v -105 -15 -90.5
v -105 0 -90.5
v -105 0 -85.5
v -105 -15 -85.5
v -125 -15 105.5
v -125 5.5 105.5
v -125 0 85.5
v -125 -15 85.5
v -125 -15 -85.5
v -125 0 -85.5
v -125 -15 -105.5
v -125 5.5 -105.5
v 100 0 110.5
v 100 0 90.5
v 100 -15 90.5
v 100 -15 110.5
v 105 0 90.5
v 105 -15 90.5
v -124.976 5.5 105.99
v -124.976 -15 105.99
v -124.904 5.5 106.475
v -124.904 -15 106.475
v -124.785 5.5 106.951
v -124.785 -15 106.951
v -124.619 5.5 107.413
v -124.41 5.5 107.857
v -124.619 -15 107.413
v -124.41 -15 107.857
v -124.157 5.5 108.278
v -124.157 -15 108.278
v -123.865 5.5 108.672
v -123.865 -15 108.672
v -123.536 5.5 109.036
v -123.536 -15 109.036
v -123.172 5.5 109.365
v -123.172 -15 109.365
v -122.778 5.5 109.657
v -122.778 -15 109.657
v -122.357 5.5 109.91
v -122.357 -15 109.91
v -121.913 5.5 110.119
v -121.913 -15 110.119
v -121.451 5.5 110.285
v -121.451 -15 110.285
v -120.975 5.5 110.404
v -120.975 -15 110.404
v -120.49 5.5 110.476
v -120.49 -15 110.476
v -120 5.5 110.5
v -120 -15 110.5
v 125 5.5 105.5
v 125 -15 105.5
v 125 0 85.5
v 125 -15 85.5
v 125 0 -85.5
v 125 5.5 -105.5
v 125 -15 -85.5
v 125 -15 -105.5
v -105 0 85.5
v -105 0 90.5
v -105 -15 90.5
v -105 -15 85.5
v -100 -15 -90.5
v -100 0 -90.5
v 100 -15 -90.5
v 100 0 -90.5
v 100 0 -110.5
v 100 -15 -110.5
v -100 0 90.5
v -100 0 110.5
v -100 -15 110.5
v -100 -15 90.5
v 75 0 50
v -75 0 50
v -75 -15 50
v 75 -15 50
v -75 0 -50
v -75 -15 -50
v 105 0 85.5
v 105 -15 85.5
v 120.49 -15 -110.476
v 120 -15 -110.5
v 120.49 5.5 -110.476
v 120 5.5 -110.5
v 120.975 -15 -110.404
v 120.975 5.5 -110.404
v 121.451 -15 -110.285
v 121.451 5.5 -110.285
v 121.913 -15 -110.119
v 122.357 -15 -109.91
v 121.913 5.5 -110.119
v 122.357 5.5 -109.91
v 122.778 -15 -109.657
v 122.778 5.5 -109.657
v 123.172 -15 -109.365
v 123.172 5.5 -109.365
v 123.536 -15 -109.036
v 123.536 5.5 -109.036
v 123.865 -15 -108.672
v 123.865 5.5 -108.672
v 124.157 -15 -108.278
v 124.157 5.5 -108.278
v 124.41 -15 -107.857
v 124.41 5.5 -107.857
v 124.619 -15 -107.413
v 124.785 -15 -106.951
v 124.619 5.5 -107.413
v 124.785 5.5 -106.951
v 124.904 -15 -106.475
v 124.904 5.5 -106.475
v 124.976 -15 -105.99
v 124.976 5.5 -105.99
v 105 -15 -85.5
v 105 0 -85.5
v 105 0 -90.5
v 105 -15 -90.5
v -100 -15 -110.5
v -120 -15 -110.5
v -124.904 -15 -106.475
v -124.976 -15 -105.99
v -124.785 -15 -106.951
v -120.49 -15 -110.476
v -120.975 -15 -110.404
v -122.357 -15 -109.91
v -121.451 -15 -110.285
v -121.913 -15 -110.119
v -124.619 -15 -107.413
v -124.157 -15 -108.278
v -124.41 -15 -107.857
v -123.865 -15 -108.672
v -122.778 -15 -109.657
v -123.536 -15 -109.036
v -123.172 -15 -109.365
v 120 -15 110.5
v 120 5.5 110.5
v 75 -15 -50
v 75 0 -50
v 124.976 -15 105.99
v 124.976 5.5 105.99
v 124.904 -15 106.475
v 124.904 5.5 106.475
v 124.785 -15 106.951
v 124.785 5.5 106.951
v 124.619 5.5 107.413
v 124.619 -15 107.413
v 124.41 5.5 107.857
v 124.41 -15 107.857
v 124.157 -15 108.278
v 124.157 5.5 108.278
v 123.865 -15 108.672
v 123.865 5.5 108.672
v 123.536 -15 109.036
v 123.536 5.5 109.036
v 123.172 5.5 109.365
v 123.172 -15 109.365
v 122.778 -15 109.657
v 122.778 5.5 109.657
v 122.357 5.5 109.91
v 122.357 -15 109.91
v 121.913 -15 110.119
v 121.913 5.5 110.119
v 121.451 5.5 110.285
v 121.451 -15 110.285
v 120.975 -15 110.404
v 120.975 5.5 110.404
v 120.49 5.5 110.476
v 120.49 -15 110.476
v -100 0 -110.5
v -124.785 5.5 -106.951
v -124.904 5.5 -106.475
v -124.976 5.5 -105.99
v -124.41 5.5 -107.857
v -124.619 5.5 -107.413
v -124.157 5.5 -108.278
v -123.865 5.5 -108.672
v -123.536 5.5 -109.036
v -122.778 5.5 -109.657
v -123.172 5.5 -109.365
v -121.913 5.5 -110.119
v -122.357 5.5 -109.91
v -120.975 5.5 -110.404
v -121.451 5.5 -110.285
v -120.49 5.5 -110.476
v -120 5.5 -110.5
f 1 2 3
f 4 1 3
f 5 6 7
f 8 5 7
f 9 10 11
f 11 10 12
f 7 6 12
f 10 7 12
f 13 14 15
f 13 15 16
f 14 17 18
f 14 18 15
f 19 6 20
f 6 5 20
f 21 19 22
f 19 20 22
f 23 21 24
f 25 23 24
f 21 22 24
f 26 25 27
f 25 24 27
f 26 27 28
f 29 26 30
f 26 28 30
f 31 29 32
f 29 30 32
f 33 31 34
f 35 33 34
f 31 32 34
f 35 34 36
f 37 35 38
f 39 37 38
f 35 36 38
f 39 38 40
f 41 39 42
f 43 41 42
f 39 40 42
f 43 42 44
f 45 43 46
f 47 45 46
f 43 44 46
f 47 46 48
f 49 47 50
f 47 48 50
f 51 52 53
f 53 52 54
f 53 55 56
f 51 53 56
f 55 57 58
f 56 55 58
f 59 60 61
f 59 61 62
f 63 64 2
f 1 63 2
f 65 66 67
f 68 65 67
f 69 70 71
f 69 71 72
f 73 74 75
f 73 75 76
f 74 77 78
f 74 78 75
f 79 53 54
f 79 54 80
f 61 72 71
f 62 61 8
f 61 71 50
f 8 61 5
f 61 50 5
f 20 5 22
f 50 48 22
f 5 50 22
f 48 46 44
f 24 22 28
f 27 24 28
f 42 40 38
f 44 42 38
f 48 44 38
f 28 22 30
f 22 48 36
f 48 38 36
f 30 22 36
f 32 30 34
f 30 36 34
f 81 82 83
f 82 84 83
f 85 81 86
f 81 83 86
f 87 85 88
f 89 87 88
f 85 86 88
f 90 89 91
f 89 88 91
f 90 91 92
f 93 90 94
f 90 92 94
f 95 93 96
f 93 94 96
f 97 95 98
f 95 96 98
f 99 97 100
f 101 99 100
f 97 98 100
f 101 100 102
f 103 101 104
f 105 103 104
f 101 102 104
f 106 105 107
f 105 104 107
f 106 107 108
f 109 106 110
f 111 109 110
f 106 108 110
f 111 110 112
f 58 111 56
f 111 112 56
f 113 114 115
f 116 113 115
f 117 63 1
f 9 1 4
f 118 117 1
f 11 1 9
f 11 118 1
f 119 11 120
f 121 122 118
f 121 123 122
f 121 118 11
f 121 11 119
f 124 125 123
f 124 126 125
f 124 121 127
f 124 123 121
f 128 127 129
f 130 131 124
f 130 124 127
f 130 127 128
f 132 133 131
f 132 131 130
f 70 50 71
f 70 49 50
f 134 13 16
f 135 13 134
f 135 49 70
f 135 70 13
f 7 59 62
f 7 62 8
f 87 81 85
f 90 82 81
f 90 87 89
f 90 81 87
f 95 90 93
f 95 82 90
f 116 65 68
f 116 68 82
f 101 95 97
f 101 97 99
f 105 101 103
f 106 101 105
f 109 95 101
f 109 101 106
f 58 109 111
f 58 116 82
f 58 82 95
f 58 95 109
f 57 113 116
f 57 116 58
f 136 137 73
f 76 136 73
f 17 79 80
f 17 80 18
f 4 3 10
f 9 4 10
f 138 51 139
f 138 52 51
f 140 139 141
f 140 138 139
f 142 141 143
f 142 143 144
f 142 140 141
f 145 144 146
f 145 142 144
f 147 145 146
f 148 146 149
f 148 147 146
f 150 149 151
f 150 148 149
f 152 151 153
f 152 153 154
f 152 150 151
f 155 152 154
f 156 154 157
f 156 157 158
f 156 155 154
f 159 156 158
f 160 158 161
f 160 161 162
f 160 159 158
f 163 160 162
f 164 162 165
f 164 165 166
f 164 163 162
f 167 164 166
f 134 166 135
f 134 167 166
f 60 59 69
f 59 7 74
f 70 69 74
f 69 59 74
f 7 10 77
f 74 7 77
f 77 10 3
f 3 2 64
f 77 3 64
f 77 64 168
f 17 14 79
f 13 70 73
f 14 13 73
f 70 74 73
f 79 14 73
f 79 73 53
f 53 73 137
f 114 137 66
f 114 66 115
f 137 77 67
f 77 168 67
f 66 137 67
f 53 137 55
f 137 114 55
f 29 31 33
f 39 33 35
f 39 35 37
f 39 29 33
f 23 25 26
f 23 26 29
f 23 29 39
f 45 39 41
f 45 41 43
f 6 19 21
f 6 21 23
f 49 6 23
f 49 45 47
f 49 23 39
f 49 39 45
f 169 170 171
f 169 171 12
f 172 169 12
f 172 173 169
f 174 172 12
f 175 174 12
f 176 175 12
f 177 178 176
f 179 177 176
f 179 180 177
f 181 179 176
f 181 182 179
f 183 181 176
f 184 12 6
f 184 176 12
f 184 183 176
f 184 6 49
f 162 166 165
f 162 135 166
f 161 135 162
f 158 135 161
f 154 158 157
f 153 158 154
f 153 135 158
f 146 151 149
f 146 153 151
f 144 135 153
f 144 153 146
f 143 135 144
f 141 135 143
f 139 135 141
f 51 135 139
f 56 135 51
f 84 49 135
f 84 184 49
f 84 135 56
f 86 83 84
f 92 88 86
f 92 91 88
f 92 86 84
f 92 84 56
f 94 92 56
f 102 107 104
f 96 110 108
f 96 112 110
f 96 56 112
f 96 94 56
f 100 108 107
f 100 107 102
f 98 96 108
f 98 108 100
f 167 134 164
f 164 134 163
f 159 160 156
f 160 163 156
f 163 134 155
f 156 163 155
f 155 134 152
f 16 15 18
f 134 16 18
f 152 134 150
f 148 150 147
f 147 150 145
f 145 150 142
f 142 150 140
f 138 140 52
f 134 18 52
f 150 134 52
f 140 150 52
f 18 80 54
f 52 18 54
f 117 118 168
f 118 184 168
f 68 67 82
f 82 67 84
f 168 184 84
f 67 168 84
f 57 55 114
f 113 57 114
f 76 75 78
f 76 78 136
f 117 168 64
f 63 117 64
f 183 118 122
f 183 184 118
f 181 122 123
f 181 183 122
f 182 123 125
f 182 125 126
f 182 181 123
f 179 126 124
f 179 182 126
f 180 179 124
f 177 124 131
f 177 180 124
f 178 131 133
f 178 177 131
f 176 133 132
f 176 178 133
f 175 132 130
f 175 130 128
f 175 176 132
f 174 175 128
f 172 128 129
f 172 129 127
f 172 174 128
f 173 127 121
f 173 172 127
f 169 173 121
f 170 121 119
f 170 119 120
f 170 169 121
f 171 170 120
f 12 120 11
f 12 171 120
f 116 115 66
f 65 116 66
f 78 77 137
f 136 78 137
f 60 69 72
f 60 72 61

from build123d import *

# Parameters (mm, degrees)
CROQUIS1_W              = 250
CROQUIS1_H              = 221
SALIENTE_EXTRUIR1_DEPTH = 5.5
SALIENTE_EXTRUIR2_DEPTH = 15
CROQUIS3_W              = 150
CROQUIS3_H              = 100
SALIENTE_EXTRUIR3_DEPTH = 15
FILLET1_R               = 5


with BuildPart() as part:
    # Croquis1 → Saliente-Extruir1 (new body)
    with BuildSketch(Plane(origin=(0, 0, 0), x_dir=(1, 0, 0), z_dir=(0, 1, 0))):
        Rectangle(CROQUIS1_W, CROQUIS1_H)
    extrude(amount=SALIENTE_EXTRUIR1_DEPTH)

    # Croquis2 → Saliente-Extruir2 (add)
    with BuildSketch(Plane.XZ):
        Polygon((-125, 110.5), (-100, 110.5), (-100, 90.5), (-105, 90.5), (-105, 85.5), (-125, 85.5), align=None)
        Polygon((125, -110.5), (125, -85.5), (105, -85.5), (105, -90.5), (100, -90.5), (100, -110.5), align=None)
    saliente_extruir2 = extrude(amount=SALIENTE_EXTRUIR2_DEPTH)

    # Simetría1: Saliente-Extruir2 across plane
    add(saliente_extruir2.mirror(Plane.XY))

    # Croquis3 → Saliente-Extruir3 (add)
    with BuildSketch(Plane.XZ):
        Rectangle(CROQUIS3_W, CROQUIS3_H)
    extrude(amount=SALIENTE_EXTRUIR3_DEPTH)

    # Fillet1
    fillet1_edges = [part.edges().sort_by_distance(p)[0] for p in [
        (125, -4.75, 110.5),
        (-125, -4.75, 110.5),
        (-125, -4.75, -110.5),
        (125, -4.75, -110.5),
    ]]
    fillet(fillet1_edges, radius=FILLET1_R)


solid = part.part
